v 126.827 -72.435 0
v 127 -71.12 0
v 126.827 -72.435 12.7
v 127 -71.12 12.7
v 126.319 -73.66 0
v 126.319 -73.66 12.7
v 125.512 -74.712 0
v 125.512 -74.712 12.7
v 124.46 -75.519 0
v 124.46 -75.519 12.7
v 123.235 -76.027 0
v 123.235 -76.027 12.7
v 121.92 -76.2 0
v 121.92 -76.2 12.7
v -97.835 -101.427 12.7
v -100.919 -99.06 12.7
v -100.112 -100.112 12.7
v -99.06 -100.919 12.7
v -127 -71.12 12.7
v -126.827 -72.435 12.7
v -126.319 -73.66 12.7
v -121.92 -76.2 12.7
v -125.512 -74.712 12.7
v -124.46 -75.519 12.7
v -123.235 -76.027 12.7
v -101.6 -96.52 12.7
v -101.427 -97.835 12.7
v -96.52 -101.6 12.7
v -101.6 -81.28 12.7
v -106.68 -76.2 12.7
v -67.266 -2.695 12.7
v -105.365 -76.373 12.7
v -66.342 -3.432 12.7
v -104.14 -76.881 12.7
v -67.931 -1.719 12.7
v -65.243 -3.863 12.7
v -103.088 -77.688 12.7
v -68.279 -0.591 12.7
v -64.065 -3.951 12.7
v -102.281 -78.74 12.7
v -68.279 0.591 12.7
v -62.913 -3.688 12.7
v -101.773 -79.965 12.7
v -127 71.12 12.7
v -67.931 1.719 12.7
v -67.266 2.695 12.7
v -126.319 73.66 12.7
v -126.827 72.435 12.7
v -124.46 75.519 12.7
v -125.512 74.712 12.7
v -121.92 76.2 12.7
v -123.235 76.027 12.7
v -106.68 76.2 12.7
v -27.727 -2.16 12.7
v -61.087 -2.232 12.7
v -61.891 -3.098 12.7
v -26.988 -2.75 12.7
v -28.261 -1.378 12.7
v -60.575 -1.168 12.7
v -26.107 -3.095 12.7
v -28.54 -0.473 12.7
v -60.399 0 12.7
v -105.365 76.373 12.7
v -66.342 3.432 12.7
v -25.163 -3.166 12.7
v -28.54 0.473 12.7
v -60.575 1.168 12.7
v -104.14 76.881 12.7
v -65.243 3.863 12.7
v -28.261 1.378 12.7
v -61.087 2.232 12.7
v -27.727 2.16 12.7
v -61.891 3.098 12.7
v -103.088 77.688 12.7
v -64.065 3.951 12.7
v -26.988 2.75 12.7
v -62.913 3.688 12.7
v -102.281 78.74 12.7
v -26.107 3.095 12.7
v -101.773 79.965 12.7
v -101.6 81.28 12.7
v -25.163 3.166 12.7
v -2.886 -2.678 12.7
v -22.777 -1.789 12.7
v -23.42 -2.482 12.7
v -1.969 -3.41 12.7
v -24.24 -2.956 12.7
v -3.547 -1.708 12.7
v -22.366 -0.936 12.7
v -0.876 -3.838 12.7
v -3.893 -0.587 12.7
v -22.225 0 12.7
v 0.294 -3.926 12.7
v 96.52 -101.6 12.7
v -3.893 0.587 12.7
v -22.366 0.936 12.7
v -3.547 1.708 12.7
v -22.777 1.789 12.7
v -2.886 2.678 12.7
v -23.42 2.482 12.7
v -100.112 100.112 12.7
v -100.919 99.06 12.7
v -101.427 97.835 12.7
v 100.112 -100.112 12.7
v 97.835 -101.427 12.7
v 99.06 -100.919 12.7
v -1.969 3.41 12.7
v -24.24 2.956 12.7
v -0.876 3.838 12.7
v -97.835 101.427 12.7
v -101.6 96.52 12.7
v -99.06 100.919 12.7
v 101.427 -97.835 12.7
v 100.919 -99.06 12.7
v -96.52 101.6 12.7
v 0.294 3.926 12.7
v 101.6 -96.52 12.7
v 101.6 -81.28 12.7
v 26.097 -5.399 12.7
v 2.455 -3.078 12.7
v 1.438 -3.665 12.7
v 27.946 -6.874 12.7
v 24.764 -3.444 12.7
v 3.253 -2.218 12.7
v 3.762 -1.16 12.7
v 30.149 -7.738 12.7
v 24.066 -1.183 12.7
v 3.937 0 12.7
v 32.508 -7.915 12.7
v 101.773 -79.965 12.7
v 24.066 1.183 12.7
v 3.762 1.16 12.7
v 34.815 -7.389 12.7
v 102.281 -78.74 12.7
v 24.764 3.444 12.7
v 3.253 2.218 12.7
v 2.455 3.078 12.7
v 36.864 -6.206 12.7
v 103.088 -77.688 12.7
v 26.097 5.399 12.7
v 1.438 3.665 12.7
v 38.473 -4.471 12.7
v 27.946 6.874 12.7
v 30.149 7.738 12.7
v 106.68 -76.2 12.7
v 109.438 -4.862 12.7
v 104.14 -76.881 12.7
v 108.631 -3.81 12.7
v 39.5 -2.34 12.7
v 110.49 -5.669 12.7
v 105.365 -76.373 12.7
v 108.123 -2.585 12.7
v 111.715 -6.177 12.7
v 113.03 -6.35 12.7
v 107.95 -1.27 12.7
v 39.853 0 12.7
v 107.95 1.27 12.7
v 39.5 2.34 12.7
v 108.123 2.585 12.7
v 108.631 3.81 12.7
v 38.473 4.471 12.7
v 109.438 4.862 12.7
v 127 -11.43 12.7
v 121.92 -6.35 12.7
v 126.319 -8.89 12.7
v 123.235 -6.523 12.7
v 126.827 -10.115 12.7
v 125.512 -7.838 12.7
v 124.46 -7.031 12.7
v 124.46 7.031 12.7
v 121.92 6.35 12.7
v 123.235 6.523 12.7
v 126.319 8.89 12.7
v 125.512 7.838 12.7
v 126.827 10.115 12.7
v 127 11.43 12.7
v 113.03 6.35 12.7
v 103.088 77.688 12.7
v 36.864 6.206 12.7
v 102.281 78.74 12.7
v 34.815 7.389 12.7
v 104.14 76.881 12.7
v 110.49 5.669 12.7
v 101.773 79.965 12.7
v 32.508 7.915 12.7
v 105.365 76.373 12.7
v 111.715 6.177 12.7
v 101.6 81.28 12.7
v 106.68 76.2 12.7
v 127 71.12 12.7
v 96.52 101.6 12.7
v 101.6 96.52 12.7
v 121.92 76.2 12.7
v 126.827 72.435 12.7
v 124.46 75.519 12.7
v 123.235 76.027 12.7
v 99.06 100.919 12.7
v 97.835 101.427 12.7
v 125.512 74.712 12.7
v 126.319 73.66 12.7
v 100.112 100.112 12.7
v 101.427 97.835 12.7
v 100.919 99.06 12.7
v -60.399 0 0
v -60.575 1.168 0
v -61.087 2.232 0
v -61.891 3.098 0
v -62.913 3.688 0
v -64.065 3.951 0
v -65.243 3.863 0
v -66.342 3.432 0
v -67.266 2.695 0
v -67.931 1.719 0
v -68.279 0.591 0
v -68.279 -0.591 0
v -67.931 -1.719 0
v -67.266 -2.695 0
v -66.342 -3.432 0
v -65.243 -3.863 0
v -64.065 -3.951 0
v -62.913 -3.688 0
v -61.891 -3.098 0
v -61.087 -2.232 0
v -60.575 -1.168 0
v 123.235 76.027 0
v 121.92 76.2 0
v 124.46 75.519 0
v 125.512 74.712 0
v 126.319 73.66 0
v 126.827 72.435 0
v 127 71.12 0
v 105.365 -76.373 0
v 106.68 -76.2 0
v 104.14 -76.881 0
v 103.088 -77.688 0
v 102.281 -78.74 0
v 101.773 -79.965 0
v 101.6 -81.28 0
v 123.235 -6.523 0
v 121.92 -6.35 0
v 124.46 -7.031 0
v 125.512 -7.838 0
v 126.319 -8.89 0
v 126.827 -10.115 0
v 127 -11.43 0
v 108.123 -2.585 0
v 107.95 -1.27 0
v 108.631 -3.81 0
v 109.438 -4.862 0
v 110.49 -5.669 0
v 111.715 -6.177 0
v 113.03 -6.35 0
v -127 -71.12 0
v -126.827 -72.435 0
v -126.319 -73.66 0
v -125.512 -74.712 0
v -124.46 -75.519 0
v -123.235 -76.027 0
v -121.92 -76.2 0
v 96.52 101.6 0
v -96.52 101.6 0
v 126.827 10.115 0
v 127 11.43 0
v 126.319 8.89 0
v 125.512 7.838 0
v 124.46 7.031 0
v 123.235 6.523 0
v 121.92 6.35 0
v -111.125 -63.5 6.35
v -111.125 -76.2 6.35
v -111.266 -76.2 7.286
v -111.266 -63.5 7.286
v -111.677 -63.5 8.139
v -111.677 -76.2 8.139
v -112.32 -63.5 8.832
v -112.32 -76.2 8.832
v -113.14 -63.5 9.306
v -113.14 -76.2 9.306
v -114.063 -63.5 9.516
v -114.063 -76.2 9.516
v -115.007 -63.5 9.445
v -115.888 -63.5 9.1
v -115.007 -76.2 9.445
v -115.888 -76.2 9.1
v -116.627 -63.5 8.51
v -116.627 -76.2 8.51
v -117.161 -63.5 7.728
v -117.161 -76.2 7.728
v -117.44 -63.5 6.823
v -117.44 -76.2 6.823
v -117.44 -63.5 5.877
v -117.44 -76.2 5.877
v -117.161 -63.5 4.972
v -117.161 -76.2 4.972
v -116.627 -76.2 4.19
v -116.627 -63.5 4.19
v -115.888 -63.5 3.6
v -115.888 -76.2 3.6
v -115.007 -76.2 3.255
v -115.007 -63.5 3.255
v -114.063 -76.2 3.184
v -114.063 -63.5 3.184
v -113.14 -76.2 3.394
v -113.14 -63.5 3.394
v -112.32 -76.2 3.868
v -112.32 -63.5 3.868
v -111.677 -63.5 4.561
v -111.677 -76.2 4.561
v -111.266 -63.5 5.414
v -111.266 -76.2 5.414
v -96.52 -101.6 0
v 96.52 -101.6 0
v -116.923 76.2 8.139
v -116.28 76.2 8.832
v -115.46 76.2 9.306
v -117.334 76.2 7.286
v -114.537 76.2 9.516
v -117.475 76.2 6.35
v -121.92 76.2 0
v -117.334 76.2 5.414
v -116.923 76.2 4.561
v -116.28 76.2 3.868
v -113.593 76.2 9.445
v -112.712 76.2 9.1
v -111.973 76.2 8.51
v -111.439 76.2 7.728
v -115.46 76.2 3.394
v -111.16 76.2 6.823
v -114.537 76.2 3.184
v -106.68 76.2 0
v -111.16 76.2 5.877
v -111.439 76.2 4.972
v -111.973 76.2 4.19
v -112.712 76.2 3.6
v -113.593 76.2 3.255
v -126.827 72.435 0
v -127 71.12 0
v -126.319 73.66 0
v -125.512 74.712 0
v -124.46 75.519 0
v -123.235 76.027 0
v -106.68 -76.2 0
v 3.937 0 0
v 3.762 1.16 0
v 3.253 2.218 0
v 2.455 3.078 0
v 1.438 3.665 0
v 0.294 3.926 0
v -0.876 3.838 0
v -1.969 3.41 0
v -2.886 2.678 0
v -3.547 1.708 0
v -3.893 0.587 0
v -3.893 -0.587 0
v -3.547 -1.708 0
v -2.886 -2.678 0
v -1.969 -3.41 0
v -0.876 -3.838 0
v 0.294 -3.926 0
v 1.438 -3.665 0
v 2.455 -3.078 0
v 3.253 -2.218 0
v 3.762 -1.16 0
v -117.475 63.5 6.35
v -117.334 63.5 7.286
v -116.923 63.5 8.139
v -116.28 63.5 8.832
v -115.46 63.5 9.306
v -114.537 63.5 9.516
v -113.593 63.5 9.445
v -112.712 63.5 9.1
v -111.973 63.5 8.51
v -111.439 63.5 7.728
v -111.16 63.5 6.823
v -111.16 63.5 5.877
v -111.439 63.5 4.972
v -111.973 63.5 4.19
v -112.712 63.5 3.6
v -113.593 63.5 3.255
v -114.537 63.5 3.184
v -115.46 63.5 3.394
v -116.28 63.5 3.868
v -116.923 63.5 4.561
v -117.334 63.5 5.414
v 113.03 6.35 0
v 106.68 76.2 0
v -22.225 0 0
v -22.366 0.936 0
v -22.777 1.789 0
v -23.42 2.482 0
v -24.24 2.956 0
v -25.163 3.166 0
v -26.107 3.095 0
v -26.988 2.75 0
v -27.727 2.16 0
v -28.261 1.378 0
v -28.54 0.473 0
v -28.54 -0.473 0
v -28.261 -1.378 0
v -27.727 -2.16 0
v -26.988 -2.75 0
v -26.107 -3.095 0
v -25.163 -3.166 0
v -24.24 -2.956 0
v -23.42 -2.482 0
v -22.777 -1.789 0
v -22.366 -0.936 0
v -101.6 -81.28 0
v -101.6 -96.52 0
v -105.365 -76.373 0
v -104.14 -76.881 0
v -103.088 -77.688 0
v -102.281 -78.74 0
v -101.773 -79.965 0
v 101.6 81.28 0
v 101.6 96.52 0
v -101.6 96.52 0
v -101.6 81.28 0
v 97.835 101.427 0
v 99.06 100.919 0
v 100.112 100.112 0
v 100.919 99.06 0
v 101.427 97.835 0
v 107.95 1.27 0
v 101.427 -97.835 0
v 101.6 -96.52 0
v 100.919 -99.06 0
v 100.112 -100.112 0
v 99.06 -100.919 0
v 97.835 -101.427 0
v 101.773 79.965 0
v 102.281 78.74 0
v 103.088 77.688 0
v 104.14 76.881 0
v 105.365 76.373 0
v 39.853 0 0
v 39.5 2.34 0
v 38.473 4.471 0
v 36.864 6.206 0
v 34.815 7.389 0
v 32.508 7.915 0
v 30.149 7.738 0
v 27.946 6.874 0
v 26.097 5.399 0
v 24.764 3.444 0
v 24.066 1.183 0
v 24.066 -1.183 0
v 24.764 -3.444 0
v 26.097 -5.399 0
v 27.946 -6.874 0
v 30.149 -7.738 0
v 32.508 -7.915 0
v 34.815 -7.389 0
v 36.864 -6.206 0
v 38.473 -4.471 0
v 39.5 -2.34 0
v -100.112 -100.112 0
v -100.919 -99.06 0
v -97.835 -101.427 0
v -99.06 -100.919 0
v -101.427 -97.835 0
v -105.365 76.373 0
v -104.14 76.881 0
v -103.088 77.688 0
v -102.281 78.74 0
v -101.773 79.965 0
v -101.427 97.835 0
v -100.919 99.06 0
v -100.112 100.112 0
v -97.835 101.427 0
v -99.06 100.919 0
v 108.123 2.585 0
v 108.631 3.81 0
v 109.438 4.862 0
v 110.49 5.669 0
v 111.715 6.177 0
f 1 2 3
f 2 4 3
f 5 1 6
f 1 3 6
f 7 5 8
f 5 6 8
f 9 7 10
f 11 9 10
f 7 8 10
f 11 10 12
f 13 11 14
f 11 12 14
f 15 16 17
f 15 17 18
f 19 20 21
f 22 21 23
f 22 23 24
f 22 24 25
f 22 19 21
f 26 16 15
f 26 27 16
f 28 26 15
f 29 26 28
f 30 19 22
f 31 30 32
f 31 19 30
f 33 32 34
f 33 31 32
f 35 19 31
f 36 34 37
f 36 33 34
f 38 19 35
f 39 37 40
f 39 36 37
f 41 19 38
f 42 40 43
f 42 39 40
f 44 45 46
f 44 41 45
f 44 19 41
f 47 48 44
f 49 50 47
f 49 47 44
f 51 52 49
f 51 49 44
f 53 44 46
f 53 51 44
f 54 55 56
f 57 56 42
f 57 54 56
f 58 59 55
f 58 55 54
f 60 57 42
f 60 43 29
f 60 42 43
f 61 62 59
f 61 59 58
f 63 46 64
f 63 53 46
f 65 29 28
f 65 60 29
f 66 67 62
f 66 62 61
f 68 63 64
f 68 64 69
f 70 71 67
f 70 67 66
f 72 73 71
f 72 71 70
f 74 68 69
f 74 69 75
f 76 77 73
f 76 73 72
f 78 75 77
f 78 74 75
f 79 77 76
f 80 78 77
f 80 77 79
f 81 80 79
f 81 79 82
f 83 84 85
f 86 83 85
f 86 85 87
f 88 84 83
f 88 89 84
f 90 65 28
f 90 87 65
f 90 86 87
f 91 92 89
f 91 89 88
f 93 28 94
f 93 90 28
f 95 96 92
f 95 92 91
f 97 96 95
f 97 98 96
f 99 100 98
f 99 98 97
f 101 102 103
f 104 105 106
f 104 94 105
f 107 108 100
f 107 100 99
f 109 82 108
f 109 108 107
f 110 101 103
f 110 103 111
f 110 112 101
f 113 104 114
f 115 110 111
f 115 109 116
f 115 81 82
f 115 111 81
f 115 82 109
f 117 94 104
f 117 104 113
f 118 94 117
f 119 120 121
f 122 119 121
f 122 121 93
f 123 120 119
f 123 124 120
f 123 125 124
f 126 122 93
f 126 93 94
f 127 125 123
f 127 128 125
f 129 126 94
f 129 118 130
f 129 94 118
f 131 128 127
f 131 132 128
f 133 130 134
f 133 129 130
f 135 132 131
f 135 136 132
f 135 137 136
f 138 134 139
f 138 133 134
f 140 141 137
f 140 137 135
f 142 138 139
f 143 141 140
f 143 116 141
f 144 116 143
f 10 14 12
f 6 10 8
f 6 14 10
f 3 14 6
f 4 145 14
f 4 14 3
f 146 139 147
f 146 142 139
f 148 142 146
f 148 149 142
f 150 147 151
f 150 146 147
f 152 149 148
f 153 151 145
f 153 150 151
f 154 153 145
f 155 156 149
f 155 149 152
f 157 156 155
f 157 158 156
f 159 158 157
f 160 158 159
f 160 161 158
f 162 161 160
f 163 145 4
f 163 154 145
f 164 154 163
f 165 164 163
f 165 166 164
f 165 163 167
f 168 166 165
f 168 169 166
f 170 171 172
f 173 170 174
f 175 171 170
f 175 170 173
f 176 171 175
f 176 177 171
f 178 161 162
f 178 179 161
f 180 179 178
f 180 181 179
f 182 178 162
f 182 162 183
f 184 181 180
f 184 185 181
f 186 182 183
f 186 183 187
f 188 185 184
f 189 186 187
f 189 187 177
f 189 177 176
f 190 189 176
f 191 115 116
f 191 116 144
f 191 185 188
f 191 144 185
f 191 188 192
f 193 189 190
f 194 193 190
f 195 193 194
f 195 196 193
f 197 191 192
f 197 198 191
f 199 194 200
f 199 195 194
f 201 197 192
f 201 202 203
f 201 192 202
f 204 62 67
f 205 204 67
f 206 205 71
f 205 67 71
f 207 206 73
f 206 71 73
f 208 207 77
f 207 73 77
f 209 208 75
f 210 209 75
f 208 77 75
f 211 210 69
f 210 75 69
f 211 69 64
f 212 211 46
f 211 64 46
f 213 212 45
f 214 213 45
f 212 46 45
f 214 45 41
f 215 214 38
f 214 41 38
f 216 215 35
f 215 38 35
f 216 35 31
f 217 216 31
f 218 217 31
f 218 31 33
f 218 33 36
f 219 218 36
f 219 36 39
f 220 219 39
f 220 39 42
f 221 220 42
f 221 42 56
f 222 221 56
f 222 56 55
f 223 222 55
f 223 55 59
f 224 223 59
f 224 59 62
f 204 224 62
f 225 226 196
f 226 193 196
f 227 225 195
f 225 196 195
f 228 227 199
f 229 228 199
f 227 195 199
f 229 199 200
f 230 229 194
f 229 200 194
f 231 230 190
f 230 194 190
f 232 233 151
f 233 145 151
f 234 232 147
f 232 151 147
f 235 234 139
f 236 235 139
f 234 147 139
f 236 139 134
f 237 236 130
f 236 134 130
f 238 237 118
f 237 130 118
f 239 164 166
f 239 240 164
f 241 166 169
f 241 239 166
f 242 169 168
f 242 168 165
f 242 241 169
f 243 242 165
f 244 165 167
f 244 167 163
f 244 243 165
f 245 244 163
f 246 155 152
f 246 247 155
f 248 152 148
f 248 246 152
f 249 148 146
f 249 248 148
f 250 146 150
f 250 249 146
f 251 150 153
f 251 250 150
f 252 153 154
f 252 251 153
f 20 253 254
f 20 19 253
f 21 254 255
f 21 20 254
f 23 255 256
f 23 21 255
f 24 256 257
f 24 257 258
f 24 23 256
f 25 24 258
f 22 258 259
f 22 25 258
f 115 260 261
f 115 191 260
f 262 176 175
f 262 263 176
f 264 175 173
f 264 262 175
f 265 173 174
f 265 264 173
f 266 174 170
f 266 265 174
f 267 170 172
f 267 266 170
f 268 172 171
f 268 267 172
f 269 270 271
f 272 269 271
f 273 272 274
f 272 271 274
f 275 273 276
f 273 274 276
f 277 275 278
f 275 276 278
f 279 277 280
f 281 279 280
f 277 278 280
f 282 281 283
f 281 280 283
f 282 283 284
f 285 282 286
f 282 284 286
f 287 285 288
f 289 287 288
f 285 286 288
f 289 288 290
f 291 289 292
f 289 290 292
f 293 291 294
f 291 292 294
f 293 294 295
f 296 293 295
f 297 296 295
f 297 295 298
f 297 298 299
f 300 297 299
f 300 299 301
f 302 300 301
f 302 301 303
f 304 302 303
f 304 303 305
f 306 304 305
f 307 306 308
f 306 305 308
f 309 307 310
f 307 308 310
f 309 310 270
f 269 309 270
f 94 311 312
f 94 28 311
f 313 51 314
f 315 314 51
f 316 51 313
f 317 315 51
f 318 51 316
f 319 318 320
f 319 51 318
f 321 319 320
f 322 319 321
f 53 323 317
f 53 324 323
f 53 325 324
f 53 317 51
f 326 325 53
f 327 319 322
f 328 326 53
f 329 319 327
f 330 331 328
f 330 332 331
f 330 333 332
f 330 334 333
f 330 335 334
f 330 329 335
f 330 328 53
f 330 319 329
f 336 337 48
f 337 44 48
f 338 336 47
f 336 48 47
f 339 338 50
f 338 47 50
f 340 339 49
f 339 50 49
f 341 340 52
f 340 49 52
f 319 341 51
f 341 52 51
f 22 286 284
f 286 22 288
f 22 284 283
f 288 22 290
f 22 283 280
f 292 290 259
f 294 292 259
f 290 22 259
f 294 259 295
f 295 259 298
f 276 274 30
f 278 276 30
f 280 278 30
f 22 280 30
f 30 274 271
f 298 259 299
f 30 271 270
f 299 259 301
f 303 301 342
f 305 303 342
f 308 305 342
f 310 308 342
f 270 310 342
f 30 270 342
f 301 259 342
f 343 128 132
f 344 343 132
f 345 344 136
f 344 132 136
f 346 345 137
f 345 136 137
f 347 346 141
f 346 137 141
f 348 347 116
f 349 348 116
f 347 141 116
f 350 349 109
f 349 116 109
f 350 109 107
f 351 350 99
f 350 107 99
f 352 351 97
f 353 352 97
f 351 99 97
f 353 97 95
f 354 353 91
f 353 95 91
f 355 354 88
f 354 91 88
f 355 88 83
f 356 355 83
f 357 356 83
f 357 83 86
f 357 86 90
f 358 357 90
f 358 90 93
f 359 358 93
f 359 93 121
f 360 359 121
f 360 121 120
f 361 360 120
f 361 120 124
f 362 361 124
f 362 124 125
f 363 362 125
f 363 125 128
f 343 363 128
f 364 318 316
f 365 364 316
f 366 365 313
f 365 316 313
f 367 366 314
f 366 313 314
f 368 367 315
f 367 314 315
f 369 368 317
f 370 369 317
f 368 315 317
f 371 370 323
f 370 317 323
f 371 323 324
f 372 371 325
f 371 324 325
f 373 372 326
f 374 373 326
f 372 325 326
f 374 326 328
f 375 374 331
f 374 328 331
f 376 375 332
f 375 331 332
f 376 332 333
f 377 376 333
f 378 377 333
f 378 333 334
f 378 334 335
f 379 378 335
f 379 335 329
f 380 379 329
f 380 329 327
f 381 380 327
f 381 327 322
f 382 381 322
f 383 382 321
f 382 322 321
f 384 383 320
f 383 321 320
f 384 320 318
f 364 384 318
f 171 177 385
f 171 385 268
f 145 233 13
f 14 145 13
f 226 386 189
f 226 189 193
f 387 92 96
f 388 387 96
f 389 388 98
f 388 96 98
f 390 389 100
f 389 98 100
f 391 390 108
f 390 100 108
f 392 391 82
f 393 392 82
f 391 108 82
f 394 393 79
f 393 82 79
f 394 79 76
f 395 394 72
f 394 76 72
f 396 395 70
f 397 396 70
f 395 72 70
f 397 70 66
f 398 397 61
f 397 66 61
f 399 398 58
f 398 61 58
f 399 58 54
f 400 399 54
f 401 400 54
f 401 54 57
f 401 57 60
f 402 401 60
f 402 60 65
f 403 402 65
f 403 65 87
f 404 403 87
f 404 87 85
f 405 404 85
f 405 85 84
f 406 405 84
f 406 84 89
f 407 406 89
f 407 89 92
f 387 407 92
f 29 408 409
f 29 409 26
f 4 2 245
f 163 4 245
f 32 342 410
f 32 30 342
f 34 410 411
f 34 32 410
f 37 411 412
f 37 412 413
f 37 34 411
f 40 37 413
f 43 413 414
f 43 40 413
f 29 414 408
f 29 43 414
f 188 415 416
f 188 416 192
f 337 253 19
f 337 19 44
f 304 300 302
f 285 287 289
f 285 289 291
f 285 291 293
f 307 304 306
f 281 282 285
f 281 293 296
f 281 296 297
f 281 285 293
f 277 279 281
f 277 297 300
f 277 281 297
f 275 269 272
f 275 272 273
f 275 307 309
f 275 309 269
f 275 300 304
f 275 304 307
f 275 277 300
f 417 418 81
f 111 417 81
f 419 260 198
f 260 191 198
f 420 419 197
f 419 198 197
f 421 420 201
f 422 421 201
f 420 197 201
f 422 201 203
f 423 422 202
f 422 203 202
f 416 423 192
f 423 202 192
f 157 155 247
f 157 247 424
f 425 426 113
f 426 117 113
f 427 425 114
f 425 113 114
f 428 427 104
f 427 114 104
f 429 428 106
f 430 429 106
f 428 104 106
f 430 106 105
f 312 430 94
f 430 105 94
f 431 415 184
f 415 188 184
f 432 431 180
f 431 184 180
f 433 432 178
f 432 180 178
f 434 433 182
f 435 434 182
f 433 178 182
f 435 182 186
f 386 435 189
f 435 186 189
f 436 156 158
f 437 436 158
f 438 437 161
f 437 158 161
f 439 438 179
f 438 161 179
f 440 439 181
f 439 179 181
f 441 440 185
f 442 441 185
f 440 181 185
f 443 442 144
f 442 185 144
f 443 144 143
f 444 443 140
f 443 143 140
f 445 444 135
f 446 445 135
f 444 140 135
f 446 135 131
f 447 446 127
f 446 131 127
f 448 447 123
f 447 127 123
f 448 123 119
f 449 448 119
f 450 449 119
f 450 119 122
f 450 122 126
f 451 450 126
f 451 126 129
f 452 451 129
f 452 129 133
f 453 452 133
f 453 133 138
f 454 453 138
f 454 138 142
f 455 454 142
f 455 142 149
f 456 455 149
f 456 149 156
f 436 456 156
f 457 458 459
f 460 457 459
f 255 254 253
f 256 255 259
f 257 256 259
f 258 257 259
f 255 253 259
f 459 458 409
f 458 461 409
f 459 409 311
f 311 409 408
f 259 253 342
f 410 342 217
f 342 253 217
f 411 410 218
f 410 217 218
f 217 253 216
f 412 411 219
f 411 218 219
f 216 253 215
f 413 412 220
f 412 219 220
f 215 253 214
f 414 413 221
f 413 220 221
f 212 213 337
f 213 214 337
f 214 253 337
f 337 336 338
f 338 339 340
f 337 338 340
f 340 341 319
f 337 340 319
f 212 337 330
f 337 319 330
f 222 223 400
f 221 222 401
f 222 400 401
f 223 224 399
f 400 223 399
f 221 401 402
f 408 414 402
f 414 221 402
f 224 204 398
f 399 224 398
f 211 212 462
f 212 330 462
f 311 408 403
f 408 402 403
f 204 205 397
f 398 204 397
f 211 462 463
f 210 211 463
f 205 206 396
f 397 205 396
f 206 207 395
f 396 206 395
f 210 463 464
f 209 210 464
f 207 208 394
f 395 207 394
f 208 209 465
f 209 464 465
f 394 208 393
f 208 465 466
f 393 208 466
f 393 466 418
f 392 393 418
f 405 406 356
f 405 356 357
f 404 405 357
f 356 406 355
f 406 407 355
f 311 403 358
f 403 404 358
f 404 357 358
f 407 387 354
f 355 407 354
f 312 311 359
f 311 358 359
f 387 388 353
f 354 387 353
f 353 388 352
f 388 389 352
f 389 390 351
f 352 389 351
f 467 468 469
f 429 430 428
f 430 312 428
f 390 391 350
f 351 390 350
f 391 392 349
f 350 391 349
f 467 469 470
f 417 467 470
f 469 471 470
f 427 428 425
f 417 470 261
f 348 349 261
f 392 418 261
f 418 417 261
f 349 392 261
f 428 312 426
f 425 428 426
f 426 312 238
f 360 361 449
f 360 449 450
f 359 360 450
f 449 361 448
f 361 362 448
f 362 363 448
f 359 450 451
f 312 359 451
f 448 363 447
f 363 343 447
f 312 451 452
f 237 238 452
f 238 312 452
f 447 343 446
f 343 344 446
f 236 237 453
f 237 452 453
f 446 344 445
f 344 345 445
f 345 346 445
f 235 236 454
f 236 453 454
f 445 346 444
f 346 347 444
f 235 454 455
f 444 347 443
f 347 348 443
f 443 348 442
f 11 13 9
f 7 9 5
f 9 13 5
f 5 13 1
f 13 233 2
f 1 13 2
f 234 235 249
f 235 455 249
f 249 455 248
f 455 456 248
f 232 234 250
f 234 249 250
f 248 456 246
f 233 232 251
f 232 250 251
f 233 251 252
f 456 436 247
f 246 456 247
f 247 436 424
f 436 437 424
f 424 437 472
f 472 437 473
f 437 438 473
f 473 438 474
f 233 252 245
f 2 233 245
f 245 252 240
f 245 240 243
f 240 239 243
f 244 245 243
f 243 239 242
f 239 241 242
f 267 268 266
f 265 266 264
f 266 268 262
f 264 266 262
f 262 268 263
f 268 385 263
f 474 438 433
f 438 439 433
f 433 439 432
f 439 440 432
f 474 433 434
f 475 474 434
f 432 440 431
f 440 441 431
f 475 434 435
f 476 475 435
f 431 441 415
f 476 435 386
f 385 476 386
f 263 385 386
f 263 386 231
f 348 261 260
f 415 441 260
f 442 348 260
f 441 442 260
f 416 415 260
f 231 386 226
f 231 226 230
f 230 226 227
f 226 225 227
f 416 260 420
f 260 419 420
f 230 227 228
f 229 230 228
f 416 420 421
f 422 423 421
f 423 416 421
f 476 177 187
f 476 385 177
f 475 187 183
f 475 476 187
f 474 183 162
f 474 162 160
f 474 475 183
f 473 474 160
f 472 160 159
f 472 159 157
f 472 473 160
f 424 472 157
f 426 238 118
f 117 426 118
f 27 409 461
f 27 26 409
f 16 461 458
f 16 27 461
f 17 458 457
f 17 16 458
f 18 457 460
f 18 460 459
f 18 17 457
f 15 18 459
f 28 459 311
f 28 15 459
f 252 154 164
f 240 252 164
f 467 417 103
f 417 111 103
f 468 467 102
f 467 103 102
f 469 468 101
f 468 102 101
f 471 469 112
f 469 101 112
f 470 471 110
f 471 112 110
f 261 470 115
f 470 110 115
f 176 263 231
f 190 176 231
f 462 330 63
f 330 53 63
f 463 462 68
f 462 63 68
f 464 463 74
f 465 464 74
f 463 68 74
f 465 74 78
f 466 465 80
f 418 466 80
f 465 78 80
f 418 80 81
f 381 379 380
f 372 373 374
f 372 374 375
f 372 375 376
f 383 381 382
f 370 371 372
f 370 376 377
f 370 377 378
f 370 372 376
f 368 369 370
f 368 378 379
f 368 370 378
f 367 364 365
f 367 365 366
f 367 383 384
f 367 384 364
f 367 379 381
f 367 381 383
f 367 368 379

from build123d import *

# Parameters (mm, degrees)
F0_W      = 254
F0_H      = 152.4
F1_DEPTH  = 12.7
F2_W      = 203.2
F2_H      = 12.7
F3_DEPTH  = 25.4
F4_W      = 203.2
F4_H      = 12.7
F5_DEPTH  = 25.4
F6_R      = 3.175
F7_DEPTH  = 12.7
F8_R      = 3.175
F9_DEPTH  = 12.7
F10_W     = 19.05
F10_H     = 12.7
F11_DEPTH = 25.4
F12_R     = 5.08
F13_R     = 3.937
F14_DEPTH = 25.4
F15_R     = 7.9375
F16_DEPTH = 25.4
F17_R     = 3.9624
F18_DEPTH = 25.4
F19_R     = 3.175
F20_DEPTH = 25.4


with BuildPart() as f1:
    # F0 (on Top) → F1 (new body)
    with BuildSketch(Plane.XY):
        Rectangle(F0_W, F0_H)
    extrude(amount=F1_DEPTH)

    # F2 (on face) → F3 (join)
    with BuildSketch(Plane(origin=(0, 76.2, 0), x_dir=(-1, 0, 0), z_dir=(0, 1, 0))):
        with Locations((0, 6.35)):
            Rectangle(F2_W, F2_H)
    extrude(amount=F3_DEPTH)

    # F4 (on face) → F5 (join)
    with BuildSketch(Plane.XZ.offset(76.2)):
        with Locations((0, 6.35)):
            Rectangle(F4_W, F4_H)
    extrude(amount=F5_DEPTH)

    # F6 (on face) → F7 (cut)
    with BuildSketch(Plane.XZ.offset(76.2)):
        with Locations((-114.3, 6.35)):
            Circle(F6_R)
    extrude(amount=-F7_DEPTH, mode=Mode.SUBTRACT)

    # F8 (on face) → F9 (cut)
    with BuildSketch(Plane(origin=(0, 76.2, 0), x_dir=(-1, 0, 0), z_dir=(0, 1, 0))):
        with Locations((114.3, 6.35)):
            Circle(F8_R)
    extrude(amount=-F9_DEPTH, mode=Mode.SUBTRACT)

    # F10 (on face) → F11 (cut)
    with BuildSketch(Plane.XY.offset(12.7)):
        with Locations((117.475, 0)):
            Rectangle(F10_W, F10_H)
    extrude(amount=-F11_DEPTH, mode=Mode.SUBTRACT)

    # F12
    f12_edges = [f1.edges().sort_by_distance(p)[0] for p in [
        (101.6, -101.6, 6.35),
        (127, -76.2, 6.35),
        (127, -6.35, 6.35),
        (127, 6.35, 6.35),
        (107.95, 6.35, 6.35),
        (107.95, -6.35, 6.35),
        (127, 76.2, 6.35),
        (101.6, 76.2, 6.35),
        (101.6, 101.6, 6.35),
        (101.6, -76.2, 6.35),
        (-101.6, -101.6, 6.35),
        (-101.6, -76.2, 6.35),
        (-127, -76.2, 6.35),
        (-127, 76.2, 6.35),
        (-101.6, 76.2, 6.35),
        (-101.6, 101.6, 6.35),
    ]]
    fillet(f12_edges, radius=F12_R)

    # F13 (on face) → F14 (cut)
    with BuildSketch(Plane.XY.offset(12.7)):
        Circle(F13_R)
    extrude(amount=-F14_DEPTH, mode=Mode.SUBTRACT)

    # F15 (on face) → F16 (cut)
    with BuildSketch(Plane.XY.offset(12.7)):
        with Locations((31.9151, 0)):
            Circle(F15_R)
    extrude(amount=-F16_DEPTH, mode=Mode.SUBTRACT)

    # F17 (on face) → F18 (cut)
    with BuildSketch(Plane.XY.offset(12.7)):
        with Locations((-64.36106, 0)):
            Circle(F17_R)
    extrude(amount=-F18_DEPTH, mode=Mode.SUBTRACT)

    # F19 (on face) → F20 (cut)
    with BuildSketch(Plane.XY.offset(12.7)):
        with Locations((-25.4, 0)):
            Circle(F19_R)
    extrude(amount=-F20_DEPTH, mode=Mode.SUBTRACT)


solid = f1.part
